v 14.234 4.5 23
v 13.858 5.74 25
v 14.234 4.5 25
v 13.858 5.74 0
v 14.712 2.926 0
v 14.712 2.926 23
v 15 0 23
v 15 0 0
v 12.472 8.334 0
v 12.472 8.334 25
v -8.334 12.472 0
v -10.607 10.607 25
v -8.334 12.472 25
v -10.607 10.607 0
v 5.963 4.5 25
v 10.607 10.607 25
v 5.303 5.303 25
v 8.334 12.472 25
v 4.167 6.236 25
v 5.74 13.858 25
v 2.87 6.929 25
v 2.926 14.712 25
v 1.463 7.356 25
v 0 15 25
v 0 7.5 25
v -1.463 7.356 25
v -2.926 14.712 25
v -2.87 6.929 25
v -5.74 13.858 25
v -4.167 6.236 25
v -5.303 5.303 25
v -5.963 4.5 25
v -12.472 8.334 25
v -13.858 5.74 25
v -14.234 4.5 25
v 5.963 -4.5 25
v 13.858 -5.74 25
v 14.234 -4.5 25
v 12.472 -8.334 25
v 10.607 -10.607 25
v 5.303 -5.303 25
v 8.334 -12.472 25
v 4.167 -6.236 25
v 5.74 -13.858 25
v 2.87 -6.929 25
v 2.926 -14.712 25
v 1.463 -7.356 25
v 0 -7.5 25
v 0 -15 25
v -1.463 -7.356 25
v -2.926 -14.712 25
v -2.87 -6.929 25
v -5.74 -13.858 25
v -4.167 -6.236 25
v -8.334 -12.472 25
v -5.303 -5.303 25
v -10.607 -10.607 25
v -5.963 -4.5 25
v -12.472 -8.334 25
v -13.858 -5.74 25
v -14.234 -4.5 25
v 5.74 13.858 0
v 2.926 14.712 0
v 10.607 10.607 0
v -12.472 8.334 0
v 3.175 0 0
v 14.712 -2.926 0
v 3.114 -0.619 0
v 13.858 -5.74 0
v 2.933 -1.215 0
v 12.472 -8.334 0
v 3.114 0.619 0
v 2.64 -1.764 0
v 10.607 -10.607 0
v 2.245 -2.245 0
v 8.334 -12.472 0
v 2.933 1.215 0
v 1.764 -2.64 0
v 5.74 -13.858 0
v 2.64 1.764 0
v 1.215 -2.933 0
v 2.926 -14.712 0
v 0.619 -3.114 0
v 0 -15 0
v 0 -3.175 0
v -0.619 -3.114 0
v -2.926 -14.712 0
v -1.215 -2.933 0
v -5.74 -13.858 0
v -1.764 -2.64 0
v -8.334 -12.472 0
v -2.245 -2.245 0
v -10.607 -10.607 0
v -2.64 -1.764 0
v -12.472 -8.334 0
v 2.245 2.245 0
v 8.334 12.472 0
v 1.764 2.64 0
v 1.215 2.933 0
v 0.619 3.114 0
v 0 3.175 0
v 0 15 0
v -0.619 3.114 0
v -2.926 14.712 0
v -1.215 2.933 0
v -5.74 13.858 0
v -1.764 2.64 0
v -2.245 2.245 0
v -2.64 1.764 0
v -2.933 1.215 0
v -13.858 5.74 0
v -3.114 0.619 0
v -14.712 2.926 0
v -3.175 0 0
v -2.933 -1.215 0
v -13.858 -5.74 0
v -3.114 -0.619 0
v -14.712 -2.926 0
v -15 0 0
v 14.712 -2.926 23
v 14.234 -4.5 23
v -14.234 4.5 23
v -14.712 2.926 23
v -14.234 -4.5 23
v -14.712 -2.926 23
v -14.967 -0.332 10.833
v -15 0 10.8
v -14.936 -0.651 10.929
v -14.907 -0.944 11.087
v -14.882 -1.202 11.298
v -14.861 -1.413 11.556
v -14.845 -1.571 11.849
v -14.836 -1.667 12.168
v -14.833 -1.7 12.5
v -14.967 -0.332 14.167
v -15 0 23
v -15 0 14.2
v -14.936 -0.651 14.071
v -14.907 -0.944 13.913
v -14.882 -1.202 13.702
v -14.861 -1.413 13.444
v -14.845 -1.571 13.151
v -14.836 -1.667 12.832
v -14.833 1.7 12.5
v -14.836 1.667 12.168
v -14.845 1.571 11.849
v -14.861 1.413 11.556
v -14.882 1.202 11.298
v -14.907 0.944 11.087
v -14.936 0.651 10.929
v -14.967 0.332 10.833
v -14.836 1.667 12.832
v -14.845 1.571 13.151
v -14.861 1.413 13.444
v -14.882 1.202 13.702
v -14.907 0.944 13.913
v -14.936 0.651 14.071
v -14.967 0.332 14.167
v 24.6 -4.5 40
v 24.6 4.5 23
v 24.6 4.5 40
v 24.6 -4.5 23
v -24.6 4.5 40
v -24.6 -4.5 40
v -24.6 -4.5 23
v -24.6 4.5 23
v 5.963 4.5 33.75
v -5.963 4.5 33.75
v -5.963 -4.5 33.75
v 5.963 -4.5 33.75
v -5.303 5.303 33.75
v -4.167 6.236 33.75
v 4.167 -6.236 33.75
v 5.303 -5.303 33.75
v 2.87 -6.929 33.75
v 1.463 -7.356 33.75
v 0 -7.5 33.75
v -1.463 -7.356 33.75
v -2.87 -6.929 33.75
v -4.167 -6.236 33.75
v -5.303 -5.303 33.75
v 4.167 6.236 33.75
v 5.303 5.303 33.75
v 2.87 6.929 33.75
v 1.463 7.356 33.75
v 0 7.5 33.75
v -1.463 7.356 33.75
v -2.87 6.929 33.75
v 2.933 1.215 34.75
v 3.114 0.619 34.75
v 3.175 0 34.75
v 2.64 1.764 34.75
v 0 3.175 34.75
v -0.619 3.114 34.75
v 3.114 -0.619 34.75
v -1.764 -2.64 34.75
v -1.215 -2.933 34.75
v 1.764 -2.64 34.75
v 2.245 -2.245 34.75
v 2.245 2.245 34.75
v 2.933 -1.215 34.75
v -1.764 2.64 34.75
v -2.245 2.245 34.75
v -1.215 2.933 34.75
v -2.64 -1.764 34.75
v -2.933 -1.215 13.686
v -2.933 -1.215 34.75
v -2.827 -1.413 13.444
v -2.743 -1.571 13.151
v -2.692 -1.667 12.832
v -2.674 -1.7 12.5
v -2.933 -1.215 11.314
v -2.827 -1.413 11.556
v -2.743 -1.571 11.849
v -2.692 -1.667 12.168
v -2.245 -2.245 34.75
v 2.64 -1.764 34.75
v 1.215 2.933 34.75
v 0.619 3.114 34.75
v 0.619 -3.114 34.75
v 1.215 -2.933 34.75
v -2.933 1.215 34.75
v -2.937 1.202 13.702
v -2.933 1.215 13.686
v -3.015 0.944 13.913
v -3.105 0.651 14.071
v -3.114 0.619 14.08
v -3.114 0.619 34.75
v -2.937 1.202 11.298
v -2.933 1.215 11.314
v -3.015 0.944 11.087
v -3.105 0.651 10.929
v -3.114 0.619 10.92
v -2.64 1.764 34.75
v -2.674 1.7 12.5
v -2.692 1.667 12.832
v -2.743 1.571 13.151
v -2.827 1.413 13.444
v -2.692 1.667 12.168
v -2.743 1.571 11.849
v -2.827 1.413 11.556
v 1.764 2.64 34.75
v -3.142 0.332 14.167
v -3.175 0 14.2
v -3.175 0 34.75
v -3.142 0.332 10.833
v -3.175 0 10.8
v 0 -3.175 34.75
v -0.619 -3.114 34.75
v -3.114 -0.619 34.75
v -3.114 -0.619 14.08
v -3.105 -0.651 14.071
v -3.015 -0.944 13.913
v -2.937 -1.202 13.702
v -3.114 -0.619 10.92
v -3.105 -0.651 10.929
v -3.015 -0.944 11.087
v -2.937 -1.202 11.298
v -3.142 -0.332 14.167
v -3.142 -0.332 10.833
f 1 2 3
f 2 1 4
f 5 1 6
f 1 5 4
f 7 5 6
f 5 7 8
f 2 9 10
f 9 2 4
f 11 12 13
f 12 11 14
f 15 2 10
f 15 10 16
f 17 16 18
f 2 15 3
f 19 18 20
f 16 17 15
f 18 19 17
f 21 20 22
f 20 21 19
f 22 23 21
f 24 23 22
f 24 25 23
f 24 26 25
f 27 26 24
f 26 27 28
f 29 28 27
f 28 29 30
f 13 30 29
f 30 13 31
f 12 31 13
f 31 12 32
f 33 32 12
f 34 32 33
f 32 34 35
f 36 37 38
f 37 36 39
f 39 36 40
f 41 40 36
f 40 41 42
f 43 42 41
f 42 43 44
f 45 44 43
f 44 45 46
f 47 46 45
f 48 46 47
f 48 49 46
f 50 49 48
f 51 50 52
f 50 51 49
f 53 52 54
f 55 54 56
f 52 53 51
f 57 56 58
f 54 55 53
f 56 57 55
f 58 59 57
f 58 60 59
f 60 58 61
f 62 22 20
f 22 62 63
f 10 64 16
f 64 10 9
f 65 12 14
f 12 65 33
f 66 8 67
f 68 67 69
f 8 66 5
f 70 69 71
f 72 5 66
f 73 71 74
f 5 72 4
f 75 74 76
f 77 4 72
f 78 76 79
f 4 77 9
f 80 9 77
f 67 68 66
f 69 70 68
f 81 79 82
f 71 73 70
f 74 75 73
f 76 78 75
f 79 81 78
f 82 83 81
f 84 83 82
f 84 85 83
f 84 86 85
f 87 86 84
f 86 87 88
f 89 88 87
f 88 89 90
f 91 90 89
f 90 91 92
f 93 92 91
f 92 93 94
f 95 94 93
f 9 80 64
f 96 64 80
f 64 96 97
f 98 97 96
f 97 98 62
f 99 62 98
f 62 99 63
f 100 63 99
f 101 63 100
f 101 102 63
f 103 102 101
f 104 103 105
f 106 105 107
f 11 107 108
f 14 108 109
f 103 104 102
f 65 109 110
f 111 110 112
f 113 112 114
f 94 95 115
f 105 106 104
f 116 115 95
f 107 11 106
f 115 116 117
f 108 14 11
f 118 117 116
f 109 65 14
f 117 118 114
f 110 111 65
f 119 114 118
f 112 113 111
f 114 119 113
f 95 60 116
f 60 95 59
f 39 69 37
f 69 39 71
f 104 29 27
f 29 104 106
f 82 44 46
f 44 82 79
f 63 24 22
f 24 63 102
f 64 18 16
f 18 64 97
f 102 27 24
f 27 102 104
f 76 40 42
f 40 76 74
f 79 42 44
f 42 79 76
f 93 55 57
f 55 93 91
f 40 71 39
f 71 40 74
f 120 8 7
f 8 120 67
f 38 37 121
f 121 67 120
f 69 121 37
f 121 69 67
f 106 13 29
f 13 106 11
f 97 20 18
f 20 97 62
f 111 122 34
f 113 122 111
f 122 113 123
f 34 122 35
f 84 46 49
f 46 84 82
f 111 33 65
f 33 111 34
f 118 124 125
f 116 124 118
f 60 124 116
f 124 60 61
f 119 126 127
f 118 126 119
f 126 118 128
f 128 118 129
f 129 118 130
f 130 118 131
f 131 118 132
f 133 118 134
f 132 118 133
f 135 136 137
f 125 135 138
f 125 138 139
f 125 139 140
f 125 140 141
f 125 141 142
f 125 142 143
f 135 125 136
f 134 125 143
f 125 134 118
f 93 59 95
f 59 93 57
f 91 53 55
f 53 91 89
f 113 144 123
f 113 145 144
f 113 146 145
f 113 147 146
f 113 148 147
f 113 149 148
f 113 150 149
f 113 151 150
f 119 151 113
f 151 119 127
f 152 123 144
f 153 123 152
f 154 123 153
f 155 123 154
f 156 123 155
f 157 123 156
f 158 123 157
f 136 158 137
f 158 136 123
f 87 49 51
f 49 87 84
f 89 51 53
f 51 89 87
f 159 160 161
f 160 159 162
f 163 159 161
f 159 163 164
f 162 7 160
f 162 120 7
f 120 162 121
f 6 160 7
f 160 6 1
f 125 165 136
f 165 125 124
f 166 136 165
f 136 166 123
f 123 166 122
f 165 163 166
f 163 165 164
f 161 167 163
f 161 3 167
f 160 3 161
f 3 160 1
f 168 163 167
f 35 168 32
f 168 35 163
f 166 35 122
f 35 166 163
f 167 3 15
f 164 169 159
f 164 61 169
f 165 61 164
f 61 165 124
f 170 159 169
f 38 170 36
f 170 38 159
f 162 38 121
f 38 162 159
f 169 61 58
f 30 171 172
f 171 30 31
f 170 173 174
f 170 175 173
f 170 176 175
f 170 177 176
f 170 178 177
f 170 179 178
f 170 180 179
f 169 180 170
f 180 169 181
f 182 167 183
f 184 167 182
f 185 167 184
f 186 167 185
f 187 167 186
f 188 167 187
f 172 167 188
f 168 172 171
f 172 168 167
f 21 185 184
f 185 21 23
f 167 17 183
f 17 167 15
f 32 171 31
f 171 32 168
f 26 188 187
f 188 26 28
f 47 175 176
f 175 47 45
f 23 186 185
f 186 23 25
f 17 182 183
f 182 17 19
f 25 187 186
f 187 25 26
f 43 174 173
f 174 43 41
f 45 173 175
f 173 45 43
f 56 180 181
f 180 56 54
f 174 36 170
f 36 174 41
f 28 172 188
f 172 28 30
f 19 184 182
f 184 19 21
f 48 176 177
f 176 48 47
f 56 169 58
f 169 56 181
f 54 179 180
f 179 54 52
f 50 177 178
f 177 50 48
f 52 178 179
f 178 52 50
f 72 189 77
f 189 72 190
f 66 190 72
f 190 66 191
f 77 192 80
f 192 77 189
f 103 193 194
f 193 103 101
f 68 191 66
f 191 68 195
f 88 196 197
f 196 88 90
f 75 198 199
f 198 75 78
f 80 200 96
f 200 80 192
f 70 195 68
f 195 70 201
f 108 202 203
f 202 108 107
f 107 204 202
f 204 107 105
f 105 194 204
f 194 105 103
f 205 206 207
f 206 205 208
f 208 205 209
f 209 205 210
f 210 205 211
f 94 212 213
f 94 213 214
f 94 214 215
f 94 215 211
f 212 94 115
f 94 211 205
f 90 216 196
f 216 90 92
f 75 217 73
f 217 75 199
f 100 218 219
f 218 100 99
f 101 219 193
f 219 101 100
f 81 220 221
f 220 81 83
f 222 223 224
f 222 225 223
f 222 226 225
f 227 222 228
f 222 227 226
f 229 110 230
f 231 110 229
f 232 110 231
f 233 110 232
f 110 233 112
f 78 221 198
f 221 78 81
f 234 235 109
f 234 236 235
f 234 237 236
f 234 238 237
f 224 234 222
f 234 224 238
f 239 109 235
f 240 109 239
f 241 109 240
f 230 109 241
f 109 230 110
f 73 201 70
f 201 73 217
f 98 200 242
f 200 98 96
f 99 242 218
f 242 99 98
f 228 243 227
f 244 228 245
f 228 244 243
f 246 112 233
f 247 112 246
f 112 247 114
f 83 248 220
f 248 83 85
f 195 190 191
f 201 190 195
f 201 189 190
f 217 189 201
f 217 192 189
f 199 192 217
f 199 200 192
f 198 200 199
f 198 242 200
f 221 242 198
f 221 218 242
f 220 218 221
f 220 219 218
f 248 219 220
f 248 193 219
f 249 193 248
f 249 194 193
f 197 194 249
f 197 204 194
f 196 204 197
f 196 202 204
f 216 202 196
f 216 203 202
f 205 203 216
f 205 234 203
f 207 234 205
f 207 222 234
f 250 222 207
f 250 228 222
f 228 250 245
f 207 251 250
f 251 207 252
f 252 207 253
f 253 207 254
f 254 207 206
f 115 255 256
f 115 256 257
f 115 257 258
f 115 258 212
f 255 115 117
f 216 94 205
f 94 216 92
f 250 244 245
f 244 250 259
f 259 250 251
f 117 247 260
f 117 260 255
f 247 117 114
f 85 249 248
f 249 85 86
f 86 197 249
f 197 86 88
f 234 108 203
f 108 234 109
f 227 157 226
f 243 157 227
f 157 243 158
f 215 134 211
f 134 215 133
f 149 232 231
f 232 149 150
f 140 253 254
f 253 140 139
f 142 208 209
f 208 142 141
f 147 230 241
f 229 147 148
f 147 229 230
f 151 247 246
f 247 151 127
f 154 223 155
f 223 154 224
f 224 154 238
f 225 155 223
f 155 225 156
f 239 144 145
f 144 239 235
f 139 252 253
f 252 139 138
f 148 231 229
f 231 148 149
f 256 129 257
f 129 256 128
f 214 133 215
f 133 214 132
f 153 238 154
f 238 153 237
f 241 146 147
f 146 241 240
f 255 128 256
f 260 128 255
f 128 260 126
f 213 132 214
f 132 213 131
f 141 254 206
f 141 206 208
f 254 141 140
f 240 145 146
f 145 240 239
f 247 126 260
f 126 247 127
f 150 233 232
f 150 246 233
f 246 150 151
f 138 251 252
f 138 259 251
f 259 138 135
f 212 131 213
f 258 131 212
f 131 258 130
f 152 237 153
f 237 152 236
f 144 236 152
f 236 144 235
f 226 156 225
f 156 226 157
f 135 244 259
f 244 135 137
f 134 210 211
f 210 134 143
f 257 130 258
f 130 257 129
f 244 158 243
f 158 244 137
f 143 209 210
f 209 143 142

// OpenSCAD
$fn = 32;

// ----------------------------------------------------------------------
// Hand knob: 30 x 49.2 x 33.75 mm
// ----------------------------------------------------------------------

// --- parameters (mm) ---
head_d = 30;              // knob diameter
head_h = 25;              // knob height
hole_d = 6.35;            // shaft bore
set_d = 3.4;              // set screw tap hole
wing_l = 49.2;            // wing span
wing_w = 9;               // wing width
wing_h = 15;              // wing thickness
cap_h = 8.75;             // raised centre cap
cap_d = 15;               // centre cap diameter

module body() {
  cylinder(h = head_h, d = head_d);
}

module wing() {
  /* wing sunk 2 mm into the knob so the joint overlaps */
  translate([-wing_l / 2, -wing_w / 2, head_h - 2])
    cube([wing_l, wing_w, wing_h + 2]);
}

module cap() {
  translate([0, 0, head_h - 1]) cylinder(h = cap_h + 1, d = cap_d);
}

difference() {
  union() {
    body();
    wing();
    cap();
  }
  translate([0, 0, -1]) cylinder(h = head_h + cap_h + 2, d = hole_d);
  translate([-head_d / 2 - 1, 0, head_h * 0.5]) rotate([0, 90, 0]) cylinder(h = head_d / 2 + 2, d = set_d);
}
